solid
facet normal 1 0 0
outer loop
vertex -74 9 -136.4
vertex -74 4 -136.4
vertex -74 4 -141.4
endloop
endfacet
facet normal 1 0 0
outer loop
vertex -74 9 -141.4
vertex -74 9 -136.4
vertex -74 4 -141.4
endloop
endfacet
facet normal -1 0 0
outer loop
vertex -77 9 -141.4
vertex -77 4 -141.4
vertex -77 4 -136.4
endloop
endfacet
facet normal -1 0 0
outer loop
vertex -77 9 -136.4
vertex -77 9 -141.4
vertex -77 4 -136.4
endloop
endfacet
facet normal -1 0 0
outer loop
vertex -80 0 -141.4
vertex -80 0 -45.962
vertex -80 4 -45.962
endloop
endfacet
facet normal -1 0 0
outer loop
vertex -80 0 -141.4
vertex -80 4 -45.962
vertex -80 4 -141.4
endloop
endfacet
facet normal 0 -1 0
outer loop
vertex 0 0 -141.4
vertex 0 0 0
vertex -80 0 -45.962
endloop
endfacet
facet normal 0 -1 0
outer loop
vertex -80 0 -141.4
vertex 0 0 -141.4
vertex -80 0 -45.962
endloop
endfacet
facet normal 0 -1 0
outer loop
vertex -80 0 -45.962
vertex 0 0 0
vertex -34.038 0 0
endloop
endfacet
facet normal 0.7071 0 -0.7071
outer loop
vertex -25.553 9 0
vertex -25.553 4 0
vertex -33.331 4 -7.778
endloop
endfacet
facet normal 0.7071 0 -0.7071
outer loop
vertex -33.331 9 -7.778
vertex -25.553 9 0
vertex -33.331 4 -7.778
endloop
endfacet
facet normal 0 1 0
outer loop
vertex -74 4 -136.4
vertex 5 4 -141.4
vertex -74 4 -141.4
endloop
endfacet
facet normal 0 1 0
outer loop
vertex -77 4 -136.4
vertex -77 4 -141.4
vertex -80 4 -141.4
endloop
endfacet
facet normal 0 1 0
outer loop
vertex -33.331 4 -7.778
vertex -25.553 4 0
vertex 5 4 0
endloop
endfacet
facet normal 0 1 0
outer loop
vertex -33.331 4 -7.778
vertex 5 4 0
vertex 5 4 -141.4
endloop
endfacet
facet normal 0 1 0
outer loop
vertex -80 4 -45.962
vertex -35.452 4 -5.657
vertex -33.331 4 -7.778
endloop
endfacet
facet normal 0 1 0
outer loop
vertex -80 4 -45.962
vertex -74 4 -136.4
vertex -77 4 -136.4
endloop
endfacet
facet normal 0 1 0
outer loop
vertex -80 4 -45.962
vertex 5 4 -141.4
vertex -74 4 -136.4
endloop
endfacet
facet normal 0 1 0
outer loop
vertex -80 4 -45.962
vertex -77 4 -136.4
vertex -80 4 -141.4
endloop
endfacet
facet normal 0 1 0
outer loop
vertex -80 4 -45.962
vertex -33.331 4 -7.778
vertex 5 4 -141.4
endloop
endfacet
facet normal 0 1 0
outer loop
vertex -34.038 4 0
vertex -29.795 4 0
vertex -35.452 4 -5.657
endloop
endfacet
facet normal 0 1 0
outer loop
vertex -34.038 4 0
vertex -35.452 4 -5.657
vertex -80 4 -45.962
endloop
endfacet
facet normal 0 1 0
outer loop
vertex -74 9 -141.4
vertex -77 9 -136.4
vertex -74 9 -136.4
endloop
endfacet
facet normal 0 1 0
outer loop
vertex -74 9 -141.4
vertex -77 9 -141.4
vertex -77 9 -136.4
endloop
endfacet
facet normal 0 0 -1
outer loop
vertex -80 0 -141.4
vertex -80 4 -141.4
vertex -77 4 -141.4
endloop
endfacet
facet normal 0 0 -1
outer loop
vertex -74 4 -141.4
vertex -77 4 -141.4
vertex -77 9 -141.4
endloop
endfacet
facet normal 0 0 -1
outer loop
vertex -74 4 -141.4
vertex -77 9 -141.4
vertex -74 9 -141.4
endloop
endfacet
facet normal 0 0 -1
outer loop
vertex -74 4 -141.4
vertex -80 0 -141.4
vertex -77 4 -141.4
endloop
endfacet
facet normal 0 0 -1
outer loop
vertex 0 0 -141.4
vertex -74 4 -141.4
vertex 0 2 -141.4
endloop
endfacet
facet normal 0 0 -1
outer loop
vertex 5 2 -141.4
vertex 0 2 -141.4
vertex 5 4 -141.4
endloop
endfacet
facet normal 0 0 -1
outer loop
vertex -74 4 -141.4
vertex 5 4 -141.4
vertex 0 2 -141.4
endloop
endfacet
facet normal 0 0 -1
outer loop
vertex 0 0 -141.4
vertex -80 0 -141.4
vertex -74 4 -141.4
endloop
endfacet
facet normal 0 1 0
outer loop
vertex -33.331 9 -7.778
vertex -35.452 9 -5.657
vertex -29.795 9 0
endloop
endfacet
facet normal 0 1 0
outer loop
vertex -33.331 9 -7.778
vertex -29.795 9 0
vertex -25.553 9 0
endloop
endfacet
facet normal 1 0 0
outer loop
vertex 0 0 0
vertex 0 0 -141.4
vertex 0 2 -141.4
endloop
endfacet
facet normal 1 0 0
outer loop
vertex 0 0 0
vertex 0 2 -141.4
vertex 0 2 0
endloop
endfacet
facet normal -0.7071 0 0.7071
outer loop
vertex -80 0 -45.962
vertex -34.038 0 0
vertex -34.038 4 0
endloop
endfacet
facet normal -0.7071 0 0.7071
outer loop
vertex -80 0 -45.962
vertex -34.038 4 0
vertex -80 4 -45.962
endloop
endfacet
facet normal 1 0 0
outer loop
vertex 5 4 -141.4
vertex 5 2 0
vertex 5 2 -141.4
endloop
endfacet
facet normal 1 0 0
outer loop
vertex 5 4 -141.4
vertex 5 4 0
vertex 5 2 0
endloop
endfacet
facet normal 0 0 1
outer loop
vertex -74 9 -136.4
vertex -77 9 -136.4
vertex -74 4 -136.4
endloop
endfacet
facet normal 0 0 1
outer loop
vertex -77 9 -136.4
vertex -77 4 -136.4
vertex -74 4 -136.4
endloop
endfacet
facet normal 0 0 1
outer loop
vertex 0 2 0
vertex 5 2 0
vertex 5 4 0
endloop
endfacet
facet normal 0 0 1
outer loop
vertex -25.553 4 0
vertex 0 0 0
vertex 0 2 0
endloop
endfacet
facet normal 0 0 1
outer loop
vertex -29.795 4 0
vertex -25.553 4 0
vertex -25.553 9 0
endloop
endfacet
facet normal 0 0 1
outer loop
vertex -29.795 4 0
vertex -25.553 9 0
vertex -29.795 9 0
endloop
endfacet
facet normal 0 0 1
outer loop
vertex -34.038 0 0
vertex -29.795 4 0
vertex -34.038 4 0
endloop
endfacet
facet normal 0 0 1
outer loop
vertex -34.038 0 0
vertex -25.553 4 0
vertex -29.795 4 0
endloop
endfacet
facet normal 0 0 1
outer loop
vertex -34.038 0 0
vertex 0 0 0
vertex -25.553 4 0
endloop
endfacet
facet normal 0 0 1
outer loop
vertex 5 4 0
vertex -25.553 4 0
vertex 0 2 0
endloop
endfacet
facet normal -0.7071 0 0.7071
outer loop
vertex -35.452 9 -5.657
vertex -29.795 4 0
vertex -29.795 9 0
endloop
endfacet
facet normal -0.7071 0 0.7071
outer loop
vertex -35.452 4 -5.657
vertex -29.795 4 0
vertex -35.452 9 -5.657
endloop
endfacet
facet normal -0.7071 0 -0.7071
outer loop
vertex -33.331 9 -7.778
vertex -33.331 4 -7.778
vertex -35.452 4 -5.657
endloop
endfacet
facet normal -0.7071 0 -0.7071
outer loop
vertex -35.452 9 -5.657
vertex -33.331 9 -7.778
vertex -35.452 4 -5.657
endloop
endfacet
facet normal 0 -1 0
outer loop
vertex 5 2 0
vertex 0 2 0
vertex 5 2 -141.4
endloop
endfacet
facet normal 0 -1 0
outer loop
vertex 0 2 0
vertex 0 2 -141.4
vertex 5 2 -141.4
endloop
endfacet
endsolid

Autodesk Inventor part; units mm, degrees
ref_plane "YZ Plane" through (0, 0, 0) normal (1, 0, 0) x (0, 1, 0)
ref_plane "XZ Plane" through (0, 0, 0) normal (0, 1, 0) x (-1, 0, 0)
ref_plane "XY Plane" through (0, 0, 0) normal (0, 0, 1) x (1, 0, 0)
sketch "Sketch1" plane through (0, 0, 0) normal (0, 1, 0) x (-1, 0, 0)
  line L0 (80, -141.4) -> (0, -141.4)
  line L1 (0, -141.4) -> (0, 0)
  line L2 (0, 0) -> (34.0381, 0)
  line L3 (34.0381, 0) -> (80, -45.9619)
  line L4 (80, -45.9619) -> (80, -141.4)
  dimension "d0" = 80
  dimension "d1" = 141.4
  dimension "d7" = 135
  dimension "d8" = 65
extrude "Extrusion1" add sketch "Sketch1" along normal blind 4
sketch "Sketch2" plane through (0, 4, 0) normal (0, 1, 0) x (1, 0, 0)
  line L0 (0, 0) -> (0, 141.4) projected
  line L1 (0, 0) -> (5, 0)
  line L2 (5, 0) -> (5, 141.4)
  line L3 (5, 141.4) -> (0, 141.4)
  line L4 (0, 141.4) -> (0, 0)
  point P0 (0, 141.4)
  dimension "d4" = 5
extrude "Extrusion2" add sketch "Sketch2" against normal blind 2
sketch "Sketch3" plane through (0, 4, 0) normal (0, 1, 0) x (1, 0, 0)
  line L0 (-34.0381, 0) -> (5, 0) projected
  line L1 (-29.7954, 0) -> (-35.4523, 5.6569)
  line L2 (-80, 45.9619) -> (-34.0381, 0) projected
  line L3 (-29.7954, 0) -> (-25.5528, 0)
  line L4 (-25.5528, 0) -> (-33.331, 7.7782)
  line L5 (-33.331, 7.7782) -> (-35.4523, 5.6569)
  line L6 (-77, 136.4) -> (-74, 136.4)
  line L7 (-74, 136.4) -> (-74, 141.4)
  line L8 (-74, 141.4) -> (-77, 141.4)
  line L9 (-77, 141.4) -> (-77, 136.4)
  line L10 (-80, 141.4) -> (-80, 45.9619) projected
  line L11 (5, 141.4) -> (-80, 141.4) projected
  point P0 (0, 0)
  dimension "d9" = 8
  dimension "d10" = 3
  dimension "d15" = 3
  dimension "d16" = 5
  dimension "d17" = 3
extrude "Extrusion3" add sketch "Sketch3" along normal blind 5
properties part number "side_wall"
